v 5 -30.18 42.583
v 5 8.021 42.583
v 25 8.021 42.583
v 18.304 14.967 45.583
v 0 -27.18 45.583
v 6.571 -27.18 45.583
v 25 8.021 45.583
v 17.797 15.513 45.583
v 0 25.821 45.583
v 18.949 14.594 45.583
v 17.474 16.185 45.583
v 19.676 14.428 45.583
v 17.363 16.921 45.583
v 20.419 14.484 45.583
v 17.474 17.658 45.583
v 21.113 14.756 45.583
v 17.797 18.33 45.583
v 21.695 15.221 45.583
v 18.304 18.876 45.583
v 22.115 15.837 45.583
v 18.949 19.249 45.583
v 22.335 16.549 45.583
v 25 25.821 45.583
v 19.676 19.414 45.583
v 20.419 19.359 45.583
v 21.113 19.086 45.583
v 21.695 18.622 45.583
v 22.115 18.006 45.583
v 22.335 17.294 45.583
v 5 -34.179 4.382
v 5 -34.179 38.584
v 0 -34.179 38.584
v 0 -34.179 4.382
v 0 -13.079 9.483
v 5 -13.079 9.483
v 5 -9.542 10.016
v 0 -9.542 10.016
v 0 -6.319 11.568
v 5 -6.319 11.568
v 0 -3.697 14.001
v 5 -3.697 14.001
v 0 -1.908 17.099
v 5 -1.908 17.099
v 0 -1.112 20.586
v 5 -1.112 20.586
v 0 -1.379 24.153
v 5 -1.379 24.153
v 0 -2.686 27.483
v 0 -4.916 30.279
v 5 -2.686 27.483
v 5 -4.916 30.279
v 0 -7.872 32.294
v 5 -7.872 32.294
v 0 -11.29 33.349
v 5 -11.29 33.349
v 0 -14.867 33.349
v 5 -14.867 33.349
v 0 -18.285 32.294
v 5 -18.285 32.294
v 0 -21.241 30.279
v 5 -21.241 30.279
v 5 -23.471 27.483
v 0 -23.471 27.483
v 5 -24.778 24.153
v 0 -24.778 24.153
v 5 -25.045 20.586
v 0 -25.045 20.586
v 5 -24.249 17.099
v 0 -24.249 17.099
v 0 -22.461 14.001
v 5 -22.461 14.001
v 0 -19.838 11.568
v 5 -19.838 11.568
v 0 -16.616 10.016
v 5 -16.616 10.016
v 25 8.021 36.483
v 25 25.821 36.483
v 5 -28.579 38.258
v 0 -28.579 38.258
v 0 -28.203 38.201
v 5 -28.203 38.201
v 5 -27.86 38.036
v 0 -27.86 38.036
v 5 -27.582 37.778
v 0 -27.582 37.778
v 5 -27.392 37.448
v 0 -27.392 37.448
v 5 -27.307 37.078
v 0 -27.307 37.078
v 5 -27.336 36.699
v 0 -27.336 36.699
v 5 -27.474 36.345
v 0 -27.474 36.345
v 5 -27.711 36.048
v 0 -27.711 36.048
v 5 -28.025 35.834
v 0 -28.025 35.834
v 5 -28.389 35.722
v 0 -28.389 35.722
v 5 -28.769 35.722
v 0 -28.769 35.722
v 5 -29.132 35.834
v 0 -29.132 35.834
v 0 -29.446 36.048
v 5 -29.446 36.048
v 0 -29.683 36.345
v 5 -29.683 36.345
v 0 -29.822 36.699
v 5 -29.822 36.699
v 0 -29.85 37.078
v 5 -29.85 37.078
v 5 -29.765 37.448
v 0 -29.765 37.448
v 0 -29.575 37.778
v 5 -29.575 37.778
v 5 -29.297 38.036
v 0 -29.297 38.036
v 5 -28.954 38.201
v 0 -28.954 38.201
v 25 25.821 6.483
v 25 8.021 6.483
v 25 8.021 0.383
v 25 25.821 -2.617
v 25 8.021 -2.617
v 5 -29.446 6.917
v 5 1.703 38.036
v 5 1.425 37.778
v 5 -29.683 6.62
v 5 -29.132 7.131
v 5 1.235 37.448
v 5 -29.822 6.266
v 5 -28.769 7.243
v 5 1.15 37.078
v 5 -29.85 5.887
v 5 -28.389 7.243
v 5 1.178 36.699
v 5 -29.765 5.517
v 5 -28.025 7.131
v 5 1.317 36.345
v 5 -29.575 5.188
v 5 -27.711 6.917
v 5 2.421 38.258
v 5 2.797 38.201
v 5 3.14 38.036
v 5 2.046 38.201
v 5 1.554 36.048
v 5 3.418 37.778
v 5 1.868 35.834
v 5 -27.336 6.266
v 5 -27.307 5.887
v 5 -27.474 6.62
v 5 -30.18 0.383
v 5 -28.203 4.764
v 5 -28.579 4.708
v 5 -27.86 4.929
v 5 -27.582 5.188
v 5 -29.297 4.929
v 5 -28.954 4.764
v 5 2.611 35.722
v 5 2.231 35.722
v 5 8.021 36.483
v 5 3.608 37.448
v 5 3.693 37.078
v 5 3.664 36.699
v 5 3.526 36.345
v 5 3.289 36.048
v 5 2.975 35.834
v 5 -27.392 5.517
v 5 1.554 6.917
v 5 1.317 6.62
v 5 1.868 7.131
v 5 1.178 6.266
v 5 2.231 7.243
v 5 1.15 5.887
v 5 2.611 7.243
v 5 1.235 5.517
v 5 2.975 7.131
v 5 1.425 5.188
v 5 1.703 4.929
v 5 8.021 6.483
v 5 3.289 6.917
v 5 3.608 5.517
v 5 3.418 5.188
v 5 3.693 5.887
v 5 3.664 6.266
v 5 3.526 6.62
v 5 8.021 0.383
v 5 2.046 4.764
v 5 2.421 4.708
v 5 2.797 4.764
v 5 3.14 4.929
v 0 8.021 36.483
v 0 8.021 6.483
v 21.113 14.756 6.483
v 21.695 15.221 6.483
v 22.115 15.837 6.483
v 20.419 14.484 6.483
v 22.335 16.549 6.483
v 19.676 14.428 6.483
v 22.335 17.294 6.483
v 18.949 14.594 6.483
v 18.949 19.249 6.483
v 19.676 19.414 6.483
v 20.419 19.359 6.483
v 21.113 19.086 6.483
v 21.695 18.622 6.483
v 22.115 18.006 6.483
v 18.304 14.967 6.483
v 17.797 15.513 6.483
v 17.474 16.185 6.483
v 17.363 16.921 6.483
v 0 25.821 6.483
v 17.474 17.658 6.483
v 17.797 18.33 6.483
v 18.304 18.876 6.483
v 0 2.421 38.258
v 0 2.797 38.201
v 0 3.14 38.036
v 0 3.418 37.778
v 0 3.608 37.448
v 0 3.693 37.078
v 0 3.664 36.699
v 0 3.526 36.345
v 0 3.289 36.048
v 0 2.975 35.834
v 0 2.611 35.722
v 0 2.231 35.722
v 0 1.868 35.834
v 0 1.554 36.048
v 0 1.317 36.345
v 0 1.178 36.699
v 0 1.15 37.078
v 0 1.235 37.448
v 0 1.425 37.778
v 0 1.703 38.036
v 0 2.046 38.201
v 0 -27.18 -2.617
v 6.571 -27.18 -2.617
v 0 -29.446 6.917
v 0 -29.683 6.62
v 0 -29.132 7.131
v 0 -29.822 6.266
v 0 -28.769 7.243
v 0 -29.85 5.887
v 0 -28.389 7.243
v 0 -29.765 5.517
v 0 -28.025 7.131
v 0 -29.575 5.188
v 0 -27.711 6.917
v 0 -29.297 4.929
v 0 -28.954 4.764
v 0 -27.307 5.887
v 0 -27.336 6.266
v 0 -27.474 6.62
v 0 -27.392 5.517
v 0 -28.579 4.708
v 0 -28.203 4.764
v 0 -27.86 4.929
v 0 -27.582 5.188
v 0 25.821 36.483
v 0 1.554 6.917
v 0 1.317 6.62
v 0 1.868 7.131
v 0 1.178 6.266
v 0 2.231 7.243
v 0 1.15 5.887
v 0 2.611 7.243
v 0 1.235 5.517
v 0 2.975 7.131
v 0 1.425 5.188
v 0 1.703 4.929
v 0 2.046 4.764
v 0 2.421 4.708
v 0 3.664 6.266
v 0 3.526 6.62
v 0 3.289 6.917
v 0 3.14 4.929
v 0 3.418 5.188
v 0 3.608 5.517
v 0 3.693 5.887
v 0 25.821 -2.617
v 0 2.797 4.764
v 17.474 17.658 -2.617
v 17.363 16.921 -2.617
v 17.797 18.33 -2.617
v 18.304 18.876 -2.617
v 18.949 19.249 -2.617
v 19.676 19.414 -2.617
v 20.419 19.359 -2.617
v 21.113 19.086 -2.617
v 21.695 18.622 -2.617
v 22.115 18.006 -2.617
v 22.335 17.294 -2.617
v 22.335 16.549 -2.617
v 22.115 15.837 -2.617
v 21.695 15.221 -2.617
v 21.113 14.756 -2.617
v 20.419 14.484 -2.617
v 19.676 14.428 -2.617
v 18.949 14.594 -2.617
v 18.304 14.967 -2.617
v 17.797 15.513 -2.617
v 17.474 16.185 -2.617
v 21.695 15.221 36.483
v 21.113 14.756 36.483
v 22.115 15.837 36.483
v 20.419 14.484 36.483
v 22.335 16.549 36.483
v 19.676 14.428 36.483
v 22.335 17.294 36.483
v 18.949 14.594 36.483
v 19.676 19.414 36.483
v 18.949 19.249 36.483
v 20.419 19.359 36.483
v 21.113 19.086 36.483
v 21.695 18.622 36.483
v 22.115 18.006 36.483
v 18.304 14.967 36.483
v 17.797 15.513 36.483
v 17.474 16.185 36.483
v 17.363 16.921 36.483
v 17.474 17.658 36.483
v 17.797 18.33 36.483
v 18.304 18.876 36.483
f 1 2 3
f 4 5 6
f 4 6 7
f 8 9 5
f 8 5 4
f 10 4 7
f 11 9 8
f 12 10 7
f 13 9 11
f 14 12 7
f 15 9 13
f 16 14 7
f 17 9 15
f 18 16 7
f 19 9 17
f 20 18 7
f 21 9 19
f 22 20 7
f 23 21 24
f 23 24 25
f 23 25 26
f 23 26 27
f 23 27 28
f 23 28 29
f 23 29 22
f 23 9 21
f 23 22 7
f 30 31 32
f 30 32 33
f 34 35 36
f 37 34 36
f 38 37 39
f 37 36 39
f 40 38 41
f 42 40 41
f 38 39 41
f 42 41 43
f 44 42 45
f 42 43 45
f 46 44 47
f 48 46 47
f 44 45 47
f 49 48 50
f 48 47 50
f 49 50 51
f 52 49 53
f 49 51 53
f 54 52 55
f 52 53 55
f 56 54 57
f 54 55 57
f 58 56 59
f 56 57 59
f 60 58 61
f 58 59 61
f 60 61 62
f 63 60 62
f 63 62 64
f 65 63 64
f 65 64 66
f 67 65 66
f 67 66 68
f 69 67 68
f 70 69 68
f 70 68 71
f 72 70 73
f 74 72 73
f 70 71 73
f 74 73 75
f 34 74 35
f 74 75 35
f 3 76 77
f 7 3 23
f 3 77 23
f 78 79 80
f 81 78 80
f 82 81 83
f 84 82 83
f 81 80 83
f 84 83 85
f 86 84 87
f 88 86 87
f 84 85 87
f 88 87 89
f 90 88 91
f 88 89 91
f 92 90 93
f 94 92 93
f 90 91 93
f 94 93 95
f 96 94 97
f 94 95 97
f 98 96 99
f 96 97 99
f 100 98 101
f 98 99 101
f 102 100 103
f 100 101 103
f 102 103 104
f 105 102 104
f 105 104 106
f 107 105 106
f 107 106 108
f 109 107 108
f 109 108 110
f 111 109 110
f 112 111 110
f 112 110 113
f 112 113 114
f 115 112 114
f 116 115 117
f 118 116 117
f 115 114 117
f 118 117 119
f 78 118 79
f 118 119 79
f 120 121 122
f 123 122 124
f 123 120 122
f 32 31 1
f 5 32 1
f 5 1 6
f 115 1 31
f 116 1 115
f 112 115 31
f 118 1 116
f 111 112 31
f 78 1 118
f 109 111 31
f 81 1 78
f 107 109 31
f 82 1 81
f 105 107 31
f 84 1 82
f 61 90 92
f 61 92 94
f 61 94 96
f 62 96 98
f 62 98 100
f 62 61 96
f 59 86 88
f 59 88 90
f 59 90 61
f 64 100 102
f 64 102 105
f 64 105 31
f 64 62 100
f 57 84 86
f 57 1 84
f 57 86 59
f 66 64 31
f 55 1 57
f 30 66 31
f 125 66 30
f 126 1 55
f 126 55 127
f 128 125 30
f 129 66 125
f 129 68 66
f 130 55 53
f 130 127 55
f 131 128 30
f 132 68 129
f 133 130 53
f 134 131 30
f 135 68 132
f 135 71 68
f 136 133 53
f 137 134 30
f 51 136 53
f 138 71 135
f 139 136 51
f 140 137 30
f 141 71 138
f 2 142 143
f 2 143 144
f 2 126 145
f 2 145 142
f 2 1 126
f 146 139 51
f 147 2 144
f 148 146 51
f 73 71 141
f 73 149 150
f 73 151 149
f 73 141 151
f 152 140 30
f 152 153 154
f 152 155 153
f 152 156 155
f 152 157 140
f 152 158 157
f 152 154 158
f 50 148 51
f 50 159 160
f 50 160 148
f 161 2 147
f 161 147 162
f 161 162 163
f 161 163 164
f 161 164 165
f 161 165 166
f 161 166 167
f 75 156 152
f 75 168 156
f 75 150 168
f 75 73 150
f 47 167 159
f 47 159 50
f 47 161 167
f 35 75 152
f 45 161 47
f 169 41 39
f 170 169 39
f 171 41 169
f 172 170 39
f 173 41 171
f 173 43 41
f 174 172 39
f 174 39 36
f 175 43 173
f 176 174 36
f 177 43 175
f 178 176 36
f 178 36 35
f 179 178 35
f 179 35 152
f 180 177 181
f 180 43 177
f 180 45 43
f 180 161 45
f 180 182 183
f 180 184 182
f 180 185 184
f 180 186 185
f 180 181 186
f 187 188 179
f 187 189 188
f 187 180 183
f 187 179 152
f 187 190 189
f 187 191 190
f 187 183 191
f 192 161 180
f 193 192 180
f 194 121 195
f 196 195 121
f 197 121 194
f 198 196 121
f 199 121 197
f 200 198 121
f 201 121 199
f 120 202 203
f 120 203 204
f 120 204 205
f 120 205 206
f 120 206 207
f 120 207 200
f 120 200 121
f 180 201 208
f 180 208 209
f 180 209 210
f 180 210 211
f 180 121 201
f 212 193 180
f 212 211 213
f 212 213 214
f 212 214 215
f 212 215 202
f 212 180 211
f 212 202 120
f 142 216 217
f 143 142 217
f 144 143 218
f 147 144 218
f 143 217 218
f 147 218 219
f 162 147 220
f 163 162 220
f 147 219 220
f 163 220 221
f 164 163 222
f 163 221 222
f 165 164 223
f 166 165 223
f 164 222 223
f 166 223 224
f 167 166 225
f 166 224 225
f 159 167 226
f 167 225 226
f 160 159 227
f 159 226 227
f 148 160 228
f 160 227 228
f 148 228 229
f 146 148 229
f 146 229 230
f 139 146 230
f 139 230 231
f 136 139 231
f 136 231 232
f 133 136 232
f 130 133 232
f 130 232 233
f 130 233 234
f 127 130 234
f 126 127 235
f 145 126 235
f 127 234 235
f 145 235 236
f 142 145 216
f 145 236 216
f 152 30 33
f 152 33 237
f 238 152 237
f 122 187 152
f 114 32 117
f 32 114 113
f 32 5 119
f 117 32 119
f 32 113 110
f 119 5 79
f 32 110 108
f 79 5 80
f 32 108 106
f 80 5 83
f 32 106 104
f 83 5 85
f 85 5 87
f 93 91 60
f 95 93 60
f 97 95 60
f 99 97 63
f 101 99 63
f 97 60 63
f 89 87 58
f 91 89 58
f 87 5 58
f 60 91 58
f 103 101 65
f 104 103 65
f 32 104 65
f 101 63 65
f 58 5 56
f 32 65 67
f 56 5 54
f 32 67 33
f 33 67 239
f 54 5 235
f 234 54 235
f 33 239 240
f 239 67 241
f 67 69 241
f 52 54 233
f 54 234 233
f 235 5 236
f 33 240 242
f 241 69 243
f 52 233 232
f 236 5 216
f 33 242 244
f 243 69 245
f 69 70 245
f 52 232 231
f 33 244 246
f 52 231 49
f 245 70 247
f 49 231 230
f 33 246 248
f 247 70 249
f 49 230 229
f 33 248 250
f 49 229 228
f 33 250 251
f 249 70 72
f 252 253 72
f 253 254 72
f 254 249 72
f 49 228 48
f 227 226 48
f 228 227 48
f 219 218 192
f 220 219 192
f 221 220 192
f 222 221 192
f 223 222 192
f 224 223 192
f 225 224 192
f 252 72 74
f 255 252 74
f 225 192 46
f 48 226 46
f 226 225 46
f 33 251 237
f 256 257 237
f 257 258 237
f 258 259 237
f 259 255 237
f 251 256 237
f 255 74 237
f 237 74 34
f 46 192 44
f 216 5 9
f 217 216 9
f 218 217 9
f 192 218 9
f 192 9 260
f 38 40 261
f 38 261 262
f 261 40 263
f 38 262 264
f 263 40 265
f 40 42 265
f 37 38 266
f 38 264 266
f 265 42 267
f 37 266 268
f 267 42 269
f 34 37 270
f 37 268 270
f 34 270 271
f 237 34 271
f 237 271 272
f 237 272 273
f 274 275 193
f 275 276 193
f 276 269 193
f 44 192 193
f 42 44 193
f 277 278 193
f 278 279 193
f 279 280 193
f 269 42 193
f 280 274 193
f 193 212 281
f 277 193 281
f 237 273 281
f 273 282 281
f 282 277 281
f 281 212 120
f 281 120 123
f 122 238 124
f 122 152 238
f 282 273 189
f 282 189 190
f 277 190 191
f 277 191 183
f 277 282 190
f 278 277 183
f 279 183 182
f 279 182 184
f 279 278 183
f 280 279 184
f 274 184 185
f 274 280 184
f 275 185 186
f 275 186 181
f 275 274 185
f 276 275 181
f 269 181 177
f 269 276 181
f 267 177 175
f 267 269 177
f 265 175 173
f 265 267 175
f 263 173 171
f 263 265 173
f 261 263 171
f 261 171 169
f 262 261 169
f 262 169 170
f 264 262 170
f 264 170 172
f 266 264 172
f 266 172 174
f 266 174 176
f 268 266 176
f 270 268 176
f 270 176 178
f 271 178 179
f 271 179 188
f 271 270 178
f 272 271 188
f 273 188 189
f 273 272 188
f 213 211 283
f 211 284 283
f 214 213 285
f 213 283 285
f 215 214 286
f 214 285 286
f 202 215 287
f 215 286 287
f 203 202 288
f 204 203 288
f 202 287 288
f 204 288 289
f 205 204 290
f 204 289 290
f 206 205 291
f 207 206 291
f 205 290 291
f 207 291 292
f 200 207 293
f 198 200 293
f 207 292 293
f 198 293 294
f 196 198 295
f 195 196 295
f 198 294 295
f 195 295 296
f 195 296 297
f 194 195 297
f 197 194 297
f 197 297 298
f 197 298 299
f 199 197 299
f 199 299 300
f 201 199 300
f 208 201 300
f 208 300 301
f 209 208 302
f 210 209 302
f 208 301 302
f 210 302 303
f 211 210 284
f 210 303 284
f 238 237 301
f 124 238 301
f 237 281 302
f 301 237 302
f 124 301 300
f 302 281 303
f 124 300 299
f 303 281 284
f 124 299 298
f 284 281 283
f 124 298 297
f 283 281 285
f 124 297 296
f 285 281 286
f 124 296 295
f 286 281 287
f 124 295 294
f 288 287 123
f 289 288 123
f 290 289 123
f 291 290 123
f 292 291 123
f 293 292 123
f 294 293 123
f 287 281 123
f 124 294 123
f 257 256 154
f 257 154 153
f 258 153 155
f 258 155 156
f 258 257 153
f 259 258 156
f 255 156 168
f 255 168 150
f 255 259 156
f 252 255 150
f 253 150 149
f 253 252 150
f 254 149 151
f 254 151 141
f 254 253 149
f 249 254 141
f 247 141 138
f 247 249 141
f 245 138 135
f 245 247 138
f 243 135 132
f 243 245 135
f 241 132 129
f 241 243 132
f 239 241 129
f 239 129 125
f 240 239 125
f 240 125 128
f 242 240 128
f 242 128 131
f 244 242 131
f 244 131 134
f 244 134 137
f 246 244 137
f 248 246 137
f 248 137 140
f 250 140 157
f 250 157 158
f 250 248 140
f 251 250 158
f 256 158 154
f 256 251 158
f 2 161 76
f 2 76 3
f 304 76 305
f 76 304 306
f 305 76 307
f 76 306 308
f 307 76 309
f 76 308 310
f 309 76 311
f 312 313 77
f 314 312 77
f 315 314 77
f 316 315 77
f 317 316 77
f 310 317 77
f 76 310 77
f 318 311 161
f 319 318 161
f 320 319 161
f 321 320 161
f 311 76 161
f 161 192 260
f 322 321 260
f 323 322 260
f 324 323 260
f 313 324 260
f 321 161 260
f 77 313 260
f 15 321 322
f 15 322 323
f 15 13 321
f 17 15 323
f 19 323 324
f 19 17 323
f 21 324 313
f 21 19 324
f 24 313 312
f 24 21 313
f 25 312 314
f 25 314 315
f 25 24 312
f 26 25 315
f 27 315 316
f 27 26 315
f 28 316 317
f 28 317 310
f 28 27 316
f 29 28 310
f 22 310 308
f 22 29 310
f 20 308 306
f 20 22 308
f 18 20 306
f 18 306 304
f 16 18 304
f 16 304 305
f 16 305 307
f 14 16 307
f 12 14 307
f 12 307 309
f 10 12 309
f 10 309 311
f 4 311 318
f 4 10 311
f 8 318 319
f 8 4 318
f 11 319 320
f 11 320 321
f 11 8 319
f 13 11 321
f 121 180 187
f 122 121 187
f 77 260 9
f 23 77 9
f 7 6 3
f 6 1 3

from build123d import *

# Parameters (mm, degrees)
SKETCH1_R           = 1.275
BOSS_EXTRUDE1_DEPTH = 5
SKETCH2_W           = 9.1
SKETCH2_H           = 17.8
BOSS_EXTRUDE2_DEPTH = 20
BOSS_EXTRUDE3_DEPTH = 3
CUT_EXTRUDE1_DEPTH  = 15
SKETCH5_R           = 2.5
CUT_EXTRUDE2_DEPTH  = 15
SKETCH7_W           = 24.2
SKETCH7_H           = 42.2
BOSS_EXTRUDE4_DEPTH = 5
SKETCH8_R           = 12
CUT_EXTRUDE3_DEPTH  = 5


with BuildPart() as part:
    # Sketch1 → Boss-Extrude1 (new body)
    with BuildSketch(Plane(origin=(0, 0, 0), x_dir=(0, 0, -1), z_dir=(1, 0, 0))):
        Polygon((-0.382647728, -30.17956484), (-0.382647728, 8.02143516), (2.617352272, 8.02143516), (2.617352272, 25.82143516), (-6.482647728, 25.82143516), (-6.482647728, 8.02143516), (-9.382647728, 8.02143516), (-9.382647728, -34.17856484), (-4.381647728, -34.17856484), align=None)
        with Locations((-5.982647728, -28.57856484)):
            Circle(SKETCH1_R, mode=Mode.SUBTRACT)
        with Locations((-5.982647728, 2.42143516)):
            Circle(SKETCH1_R, mode=Mode.SUBTRACT)
    extrude(amount=BOSS_EXTRUDE1_DEPTH)

    # Sketch2 → Boss-Extrude2 (add)
    with BuildSketch(Plane(origin=(5, 0, 0), x_dir=(0, 0, -1), z_dir=(1, 0, 0))):
        with Locations((-1.932647728, 16.92143516)):
            Rectangle(SKETCH2_W, SKETCH2_H)
    extrude(amount=BOSS_EXTRUDE2_DEPTH)

    # Sketch3 → Boss-Extrude3 (add)
    with BuildSketch(Plane(origin=(0, 0, 0.382647728), x_dir=(-1, 0, 0), z_dir=(0, 0, -1))):
        Polygon((-25, 8.02143516), (0, 8.02143516), (0, -30.17956484), (-5, -30.17956484), align=None)
    extrude(amount=BOSS_EXTRUDE3_DEPTH)

    # Sketch4 → Cut-Extrude1 (cut, symmetric)
    with BuildSketch(Plane(origin=(5, 0, 0), x_dir=(0, 0, -1), z_dir=(1, 0, 0))):
        Polygon((-0.382647728, -30.17956484), (2.617352272, -27.17956484), (2.617352272, -30.17956484), align=None)
    extrude(amount=CUT_EXTRUDE1_DEPTH, both=True, mode=Mode.SUBTRACT)

    # Sketch5 → Cut-Extrude2 (cut, symmetric)
    with BuildSketch(Plane(origin=(0, 0, -2.617352272), x_dir=(-1, 0, 0), z_dir=(0, 0, -1))):
        with Locations((-19.86272871, 16.92143516)):
            Circle(SKETCH5_R)
    extrude(amount=CUT_EXTRUDE2_DEPTH, both=True, mode=Mode.SUBTRACT)


with BuildPart() as body_2:
    # Mirror14: mirrored copy
    add(part.part.mirror(Plane.XY.offset(21.482647728)))


with BuildPart() as part_1:
    add(part.part)

    add(body_2.part)  # Boss-Extrude4 merges body 2
    # Sketch7 → Boss-Extrude4 (add)
    with BuildSketch(Plane(origin=(5, 0, 0), x_dir=(0, 0, -1), z_dir=(1, 0, 0))):
        with Locations((-21.482647728, -13.07856484)):
            Rectangle(SKETCH7_W, SKETCH7_H)
    extrude(amount=-BOSS_EXTRUDE4_DEPTH)

    # Sketch8 → Cut-Extrude3 (cut)
    with BuildSketch(Plane(origin=(5, 0, 0), x_dir=(0, 0, -1), z_dir=(1, 0, 0))):
        with Locations((-21.482647728, -13.07856484)):
            Circle(SKETCH8_R)
    extrude(amount=-CUT_EXTRUDE3_DEPTH, mode=Mode.SUBTRACT)


solid = part_1.part
